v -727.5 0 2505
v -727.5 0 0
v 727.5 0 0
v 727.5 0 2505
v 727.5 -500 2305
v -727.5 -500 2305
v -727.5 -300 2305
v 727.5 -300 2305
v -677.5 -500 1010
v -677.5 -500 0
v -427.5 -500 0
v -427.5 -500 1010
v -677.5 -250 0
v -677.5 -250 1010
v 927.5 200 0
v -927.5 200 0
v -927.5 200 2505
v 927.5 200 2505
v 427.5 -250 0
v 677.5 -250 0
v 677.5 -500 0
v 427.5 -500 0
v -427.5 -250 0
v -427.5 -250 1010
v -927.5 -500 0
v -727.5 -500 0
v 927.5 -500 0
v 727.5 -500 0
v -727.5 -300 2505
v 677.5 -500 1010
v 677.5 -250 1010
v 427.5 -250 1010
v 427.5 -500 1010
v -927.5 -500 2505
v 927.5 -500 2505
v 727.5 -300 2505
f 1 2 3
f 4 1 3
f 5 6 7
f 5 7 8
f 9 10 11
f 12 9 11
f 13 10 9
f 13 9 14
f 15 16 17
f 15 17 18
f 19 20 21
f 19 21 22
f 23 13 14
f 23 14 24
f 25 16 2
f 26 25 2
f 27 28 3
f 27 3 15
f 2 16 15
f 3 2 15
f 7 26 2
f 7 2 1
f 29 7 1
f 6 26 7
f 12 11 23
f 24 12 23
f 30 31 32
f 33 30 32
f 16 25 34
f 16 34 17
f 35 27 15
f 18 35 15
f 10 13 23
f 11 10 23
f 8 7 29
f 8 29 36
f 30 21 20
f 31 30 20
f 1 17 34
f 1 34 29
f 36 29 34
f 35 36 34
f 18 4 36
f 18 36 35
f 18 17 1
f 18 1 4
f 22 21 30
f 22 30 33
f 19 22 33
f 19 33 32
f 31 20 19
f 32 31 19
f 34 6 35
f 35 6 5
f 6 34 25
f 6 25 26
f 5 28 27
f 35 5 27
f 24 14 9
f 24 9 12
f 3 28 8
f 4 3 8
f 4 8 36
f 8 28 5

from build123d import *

# Parameters (mm, degrees)
F0_W     = 1855
F0_H     = 700
F1_DEPTH = 2505
F2_W     = 1455
F2_H     = 2305
F3_DEPTH = 500
F4_W     = 1455
F4_H     = 300
F5_DEPTH = 200.001
F6_W     = 250
F6_H     = 250
F7_DEPTH = 1010


with BuildPart() as f1:
    # F0 (on Top) → F1 (new body)
    with BuildSketch(Plane.XY):
        with Locations((0, -150)):
            Rectangle(F0_W, F0_H)
    extrude(amount=F1_DEPTH)

    # F2 (on face) → F3 (cut)
    with BuildSketch(Plane.XZ.offset(500)):
        with Locations((0, 1152.5)):
            Rectangle(F2_W, F2_H)
    extrude(amount=-F3_DEPTH, mode=Mode.SUBTRACT)

    # F4 (on face) → F5 (cut, through all)
    with BuildSketch(Plane(origin=(0, 0, 2305), x_dir=(1, 0, 0), z_dir=(0, 0, -1))):
        with Locations((0, 150)):
            Rectangle(F4_W, F4_H)
    extrude(amount=-F5_DEPTH, mode=Mode.SUBTRACT)


with BuildPart() as f7:
    # F6 (on Top) → F7 (new body)
    with BuildSketch(Plane.XY):
        with Locations((-552.5, -375)):
            Rectangle(F6_W, F6_H)
    extrude(amount=F7_DEPTH)


with BuildPart() as f8_1:
    # F8: instance of F7
    add(f7.part.mirror(Plane.YZ))


solid = Compound([f1.part, f7.part, f8_1.part])
